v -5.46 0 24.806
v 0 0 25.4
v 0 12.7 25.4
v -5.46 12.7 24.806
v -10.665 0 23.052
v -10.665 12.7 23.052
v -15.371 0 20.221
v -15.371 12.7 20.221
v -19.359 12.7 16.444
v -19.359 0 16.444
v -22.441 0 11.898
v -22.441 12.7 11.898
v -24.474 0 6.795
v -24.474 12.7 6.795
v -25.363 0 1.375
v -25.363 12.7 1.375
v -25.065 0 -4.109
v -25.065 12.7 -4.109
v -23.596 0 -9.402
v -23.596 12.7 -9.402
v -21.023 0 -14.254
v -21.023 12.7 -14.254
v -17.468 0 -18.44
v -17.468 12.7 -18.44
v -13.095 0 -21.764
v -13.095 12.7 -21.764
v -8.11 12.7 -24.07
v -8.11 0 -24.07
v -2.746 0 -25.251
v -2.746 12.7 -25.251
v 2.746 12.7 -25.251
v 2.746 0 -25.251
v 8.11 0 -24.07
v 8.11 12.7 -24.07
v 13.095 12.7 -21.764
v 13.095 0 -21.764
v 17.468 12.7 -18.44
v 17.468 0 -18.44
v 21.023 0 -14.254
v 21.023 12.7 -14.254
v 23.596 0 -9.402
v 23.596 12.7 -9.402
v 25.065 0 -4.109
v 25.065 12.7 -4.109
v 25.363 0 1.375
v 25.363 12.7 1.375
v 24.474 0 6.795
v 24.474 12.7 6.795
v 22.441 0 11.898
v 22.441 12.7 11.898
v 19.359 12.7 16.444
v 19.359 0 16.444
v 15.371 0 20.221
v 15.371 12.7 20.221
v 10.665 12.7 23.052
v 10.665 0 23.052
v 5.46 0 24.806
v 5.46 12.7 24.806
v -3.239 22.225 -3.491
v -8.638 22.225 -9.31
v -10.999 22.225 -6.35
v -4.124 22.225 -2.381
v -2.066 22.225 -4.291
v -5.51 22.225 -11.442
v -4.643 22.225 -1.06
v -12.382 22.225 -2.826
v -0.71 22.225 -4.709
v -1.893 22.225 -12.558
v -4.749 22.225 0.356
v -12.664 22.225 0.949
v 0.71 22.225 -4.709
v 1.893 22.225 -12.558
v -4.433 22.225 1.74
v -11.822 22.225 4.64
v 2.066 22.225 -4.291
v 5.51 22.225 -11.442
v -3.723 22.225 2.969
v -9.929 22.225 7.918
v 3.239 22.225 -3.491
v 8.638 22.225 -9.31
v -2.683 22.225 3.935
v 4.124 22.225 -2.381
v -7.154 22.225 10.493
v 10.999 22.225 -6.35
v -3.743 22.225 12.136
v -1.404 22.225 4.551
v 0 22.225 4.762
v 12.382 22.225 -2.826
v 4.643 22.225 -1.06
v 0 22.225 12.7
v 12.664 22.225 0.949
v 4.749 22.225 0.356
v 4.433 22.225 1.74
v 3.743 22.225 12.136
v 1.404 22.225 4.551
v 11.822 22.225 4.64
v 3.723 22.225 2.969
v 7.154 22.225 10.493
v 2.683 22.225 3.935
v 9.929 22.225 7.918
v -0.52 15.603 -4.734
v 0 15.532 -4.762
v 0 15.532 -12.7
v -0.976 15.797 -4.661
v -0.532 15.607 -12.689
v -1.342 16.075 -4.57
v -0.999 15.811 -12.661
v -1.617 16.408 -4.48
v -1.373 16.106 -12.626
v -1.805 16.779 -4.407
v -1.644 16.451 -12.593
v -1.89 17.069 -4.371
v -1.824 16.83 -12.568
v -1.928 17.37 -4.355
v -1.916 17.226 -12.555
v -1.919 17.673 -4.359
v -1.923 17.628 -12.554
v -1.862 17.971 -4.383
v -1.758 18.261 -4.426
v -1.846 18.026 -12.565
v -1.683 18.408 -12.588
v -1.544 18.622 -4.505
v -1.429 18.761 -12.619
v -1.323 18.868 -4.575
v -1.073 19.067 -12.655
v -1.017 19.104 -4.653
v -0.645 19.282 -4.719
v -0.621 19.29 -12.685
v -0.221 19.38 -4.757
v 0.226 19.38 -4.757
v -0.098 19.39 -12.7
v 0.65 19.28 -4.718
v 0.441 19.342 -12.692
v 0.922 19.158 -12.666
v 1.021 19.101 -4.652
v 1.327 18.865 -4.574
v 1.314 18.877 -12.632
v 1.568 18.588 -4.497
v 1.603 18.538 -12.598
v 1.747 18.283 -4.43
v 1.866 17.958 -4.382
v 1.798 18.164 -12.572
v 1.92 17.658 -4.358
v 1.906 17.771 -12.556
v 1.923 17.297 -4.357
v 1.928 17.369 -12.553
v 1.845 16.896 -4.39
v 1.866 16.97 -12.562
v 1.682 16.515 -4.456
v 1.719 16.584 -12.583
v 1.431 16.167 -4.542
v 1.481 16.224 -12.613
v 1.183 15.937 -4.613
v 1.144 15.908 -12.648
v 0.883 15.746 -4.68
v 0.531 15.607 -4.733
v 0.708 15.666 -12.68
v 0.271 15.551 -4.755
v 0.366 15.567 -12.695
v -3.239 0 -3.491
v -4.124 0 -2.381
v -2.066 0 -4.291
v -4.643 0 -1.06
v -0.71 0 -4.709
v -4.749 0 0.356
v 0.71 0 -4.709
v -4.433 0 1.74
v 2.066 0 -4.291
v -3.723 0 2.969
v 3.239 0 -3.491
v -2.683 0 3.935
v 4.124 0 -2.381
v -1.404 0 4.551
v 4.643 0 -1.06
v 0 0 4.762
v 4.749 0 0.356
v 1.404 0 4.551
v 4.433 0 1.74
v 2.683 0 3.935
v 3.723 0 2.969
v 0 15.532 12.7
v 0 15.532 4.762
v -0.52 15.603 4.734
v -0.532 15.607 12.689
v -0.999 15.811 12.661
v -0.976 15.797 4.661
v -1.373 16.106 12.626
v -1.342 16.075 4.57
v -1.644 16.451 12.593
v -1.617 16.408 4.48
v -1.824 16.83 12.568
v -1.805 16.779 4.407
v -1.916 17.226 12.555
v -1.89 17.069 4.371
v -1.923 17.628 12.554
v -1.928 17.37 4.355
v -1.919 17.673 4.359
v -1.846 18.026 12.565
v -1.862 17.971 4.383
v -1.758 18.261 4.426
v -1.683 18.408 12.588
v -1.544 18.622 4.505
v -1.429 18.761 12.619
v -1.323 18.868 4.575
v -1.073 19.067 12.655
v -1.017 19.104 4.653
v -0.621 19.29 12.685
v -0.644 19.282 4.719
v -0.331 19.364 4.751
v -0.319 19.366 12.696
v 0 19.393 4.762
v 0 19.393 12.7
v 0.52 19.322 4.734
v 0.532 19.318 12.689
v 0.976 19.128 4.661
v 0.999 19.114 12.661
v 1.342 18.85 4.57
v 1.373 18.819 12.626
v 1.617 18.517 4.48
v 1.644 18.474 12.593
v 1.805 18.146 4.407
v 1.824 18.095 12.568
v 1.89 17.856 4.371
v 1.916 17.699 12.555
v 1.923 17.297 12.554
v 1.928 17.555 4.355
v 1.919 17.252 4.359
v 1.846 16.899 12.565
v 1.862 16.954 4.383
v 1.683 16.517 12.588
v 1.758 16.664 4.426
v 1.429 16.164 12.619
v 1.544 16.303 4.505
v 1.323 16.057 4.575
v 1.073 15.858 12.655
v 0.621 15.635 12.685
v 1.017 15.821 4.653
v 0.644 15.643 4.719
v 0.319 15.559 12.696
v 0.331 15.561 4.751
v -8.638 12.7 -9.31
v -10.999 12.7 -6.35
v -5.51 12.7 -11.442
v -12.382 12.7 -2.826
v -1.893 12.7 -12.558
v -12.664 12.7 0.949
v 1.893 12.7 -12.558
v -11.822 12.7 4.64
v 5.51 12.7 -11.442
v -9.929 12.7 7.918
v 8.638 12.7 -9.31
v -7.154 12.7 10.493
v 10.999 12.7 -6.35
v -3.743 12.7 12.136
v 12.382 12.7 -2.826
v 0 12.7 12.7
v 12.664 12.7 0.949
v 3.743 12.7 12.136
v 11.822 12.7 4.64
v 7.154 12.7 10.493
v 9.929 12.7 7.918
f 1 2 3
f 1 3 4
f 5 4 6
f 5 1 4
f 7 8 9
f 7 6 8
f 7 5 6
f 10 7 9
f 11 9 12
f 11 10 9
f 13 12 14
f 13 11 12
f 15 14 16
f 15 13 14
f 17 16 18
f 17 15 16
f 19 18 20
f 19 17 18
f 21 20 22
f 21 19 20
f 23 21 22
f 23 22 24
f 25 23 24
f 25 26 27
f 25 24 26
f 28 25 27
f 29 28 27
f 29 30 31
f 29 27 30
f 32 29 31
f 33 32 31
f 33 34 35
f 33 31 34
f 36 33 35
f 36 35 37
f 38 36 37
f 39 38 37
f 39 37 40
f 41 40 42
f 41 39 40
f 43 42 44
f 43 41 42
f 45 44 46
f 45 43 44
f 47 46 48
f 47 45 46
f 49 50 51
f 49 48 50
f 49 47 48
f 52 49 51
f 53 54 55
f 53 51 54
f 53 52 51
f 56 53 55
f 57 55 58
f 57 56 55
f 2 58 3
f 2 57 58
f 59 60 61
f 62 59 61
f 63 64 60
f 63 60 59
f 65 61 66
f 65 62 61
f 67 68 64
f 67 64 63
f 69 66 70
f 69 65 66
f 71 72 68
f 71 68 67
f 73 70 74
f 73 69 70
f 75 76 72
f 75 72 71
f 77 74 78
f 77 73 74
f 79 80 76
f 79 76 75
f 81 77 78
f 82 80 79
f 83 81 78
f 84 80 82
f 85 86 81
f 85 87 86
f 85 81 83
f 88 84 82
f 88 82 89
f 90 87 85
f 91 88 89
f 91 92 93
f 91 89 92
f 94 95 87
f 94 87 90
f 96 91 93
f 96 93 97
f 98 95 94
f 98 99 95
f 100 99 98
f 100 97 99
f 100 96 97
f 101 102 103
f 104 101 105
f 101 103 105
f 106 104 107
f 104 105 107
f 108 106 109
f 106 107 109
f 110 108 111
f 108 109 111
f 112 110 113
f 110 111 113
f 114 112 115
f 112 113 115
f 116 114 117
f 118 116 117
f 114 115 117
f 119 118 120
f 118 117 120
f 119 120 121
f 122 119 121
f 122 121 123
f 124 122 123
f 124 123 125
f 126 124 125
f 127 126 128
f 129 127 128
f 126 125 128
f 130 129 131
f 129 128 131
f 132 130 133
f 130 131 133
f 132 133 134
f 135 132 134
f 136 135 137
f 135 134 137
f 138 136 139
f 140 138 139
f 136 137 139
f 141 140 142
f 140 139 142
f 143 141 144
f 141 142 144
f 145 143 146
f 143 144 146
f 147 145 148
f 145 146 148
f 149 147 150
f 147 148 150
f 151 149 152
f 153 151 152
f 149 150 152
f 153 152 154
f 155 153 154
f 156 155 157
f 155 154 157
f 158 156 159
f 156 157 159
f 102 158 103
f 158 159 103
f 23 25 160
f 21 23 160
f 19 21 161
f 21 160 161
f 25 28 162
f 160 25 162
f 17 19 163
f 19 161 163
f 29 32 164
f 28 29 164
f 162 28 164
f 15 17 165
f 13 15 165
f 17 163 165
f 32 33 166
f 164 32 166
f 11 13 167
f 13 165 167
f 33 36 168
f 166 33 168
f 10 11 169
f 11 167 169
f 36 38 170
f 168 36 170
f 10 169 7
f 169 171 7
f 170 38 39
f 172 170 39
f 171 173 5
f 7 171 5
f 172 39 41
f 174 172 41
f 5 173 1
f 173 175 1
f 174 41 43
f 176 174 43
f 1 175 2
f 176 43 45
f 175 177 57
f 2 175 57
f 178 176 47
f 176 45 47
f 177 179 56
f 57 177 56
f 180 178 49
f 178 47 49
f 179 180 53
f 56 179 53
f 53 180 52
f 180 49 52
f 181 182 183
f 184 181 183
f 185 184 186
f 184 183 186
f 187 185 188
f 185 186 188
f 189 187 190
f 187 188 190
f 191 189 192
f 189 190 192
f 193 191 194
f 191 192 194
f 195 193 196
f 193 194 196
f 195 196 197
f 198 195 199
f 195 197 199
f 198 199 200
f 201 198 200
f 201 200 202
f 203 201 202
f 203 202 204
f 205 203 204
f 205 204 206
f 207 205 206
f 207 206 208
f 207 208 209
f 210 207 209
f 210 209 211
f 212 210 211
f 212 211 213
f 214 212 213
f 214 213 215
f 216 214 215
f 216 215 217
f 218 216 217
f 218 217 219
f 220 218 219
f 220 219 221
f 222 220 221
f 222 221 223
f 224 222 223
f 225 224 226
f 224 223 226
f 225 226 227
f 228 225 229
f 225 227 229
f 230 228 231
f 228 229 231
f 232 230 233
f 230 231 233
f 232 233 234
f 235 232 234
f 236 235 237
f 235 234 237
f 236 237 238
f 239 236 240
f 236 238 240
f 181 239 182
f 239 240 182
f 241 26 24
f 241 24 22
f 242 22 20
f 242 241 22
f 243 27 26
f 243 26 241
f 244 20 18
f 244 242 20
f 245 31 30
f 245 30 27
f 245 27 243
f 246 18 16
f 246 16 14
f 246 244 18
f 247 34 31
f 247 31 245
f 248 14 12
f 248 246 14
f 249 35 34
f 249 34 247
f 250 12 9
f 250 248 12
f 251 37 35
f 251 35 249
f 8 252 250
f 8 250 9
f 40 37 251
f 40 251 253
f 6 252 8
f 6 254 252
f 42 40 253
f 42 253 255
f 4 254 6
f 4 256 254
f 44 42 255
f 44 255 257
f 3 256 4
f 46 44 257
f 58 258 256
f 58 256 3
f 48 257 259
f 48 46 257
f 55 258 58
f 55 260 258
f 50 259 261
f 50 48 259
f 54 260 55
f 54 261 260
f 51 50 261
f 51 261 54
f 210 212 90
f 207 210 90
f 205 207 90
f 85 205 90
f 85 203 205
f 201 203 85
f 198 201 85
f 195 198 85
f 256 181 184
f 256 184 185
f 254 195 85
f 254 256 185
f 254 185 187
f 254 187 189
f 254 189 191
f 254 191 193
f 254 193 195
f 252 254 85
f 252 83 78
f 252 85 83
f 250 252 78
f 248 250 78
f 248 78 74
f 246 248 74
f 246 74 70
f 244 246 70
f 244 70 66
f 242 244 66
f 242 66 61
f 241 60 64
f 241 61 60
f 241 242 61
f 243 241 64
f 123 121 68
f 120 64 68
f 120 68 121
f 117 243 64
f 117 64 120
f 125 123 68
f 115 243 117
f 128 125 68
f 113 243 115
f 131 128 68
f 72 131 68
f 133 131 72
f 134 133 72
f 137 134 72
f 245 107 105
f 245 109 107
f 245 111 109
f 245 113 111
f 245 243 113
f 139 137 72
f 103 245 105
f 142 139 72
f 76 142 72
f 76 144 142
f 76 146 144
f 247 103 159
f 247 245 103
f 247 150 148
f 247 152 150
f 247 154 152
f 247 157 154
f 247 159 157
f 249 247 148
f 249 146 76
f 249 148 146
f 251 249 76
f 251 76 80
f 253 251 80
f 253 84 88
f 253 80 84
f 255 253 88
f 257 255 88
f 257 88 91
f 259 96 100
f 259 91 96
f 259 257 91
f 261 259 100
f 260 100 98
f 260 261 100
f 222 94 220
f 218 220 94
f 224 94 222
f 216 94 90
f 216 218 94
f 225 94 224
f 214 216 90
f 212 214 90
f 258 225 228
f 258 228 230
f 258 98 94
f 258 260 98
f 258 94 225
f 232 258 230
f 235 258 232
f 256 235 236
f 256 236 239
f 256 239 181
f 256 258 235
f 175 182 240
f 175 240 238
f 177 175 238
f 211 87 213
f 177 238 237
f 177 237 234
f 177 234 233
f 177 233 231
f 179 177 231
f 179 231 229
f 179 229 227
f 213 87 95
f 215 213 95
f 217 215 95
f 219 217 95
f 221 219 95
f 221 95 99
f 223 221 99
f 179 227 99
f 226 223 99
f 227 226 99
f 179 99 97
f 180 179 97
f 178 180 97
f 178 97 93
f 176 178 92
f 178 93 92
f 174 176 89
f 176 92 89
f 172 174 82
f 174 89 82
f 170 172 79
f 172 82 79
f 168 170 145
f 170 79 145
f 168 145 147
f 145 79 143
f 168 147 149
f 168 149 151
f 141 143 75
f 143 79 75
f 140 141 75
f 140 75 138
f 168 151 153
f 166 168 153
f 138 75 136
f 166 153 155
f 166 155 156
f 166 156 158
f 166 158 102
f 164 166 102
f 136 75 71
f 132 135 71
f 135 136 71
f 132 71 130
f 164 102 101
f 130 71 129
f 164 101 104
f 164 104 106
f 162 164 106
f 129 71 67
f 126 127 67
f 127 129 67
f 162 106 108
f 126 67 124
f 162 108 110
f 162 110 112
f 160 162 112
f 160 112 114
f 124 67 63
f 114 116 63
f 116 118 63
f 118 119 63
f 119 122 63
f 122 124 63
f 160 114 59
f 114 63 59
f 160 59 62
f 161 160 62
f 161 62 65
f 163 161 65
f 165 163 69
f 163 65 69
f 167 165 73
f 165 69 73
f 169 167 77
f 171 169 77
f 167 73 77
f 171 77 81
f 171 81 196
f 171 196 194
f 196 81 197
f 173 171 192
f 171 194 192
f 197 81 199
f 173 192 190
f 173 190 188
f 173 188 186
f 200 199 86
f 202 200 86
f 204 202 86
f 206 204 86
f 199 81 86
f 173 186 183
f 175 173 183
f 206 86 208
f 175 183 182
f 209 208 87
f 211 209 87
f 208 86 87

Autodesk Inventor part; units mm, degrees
ref_plane "YZ Plane" through (0, 0, 0) normal (1, 0, 0) x (0, 1, 0)
ref_plane "XZ Plane" through (0, 0, 0) normal (0, 1, 0) x (-1, 0, 0)
ref_plane "XY Plane" through (0, 0, 0) normal (0, 0, 1) x (1, 0, 0)
sketch "Sketch1" plane through (0, 0, 0) normal (1, 0, 0) x (0, 1, 0)
  line L0 (22.225, 4.7625) -> (22.225, 12.7)
  line L1 (22.225, 12.7) -> (12.7, 12.7)
  line L2 (12.7, 12.7) -> (12.7, 25.4)
  line L3 (12.7, 25.4) -> (0, 25.4)
  line L4 (0, 25.4) -> (0, 4.7625)
  line L5 (0, 4.7625) -> (22.225, 4.7625)
  line L6 (-4.445, 0) -> (26.67, 0) projected
  line L7 (0, -5.08) -> (0, 30.48) construction
  point P0 (0, 0)
  dimension "d0" = 25.4
  dimension "d1" = 9.525
  dimension "d2" = 22.225
  dimension "d4" = 12.7
  dimension "d5" = 50.8
revolve "Revolution1" add sketch "Sketch1" angle 360 about axis through (0, -10, 0) along (0, 1, 0)
sketch "Sketch2" plane through (0, 22.225, 0) normal (0, 1, 0) x (1, 0, 0)
  circle A0 centre (0, 0) radius 12.7 projected
  point P0 (0, -12.7)
ref_plane "Work Plane1" through (0, 22.225, 12.7) normal (0, 0, 1) x (1, 0, 0)
sketch "Sketch3" plane through (0, 22.225, 12.7) normal (0, 0, 1) x (1, 0, 0)
  line L0 (12.7, 0) -> (-12.7, 0) projected
  point P0 (0, -22.225)
  point P1 (0, -4.7625)
  dimension "d7" = 4.7625
hole "Hole1" at (0, 17.4625, 12.7) direction (0, 0, -1) diameter 3.8608 end through all
properties part number "Clamp Knob" material "Iron, Cast"
